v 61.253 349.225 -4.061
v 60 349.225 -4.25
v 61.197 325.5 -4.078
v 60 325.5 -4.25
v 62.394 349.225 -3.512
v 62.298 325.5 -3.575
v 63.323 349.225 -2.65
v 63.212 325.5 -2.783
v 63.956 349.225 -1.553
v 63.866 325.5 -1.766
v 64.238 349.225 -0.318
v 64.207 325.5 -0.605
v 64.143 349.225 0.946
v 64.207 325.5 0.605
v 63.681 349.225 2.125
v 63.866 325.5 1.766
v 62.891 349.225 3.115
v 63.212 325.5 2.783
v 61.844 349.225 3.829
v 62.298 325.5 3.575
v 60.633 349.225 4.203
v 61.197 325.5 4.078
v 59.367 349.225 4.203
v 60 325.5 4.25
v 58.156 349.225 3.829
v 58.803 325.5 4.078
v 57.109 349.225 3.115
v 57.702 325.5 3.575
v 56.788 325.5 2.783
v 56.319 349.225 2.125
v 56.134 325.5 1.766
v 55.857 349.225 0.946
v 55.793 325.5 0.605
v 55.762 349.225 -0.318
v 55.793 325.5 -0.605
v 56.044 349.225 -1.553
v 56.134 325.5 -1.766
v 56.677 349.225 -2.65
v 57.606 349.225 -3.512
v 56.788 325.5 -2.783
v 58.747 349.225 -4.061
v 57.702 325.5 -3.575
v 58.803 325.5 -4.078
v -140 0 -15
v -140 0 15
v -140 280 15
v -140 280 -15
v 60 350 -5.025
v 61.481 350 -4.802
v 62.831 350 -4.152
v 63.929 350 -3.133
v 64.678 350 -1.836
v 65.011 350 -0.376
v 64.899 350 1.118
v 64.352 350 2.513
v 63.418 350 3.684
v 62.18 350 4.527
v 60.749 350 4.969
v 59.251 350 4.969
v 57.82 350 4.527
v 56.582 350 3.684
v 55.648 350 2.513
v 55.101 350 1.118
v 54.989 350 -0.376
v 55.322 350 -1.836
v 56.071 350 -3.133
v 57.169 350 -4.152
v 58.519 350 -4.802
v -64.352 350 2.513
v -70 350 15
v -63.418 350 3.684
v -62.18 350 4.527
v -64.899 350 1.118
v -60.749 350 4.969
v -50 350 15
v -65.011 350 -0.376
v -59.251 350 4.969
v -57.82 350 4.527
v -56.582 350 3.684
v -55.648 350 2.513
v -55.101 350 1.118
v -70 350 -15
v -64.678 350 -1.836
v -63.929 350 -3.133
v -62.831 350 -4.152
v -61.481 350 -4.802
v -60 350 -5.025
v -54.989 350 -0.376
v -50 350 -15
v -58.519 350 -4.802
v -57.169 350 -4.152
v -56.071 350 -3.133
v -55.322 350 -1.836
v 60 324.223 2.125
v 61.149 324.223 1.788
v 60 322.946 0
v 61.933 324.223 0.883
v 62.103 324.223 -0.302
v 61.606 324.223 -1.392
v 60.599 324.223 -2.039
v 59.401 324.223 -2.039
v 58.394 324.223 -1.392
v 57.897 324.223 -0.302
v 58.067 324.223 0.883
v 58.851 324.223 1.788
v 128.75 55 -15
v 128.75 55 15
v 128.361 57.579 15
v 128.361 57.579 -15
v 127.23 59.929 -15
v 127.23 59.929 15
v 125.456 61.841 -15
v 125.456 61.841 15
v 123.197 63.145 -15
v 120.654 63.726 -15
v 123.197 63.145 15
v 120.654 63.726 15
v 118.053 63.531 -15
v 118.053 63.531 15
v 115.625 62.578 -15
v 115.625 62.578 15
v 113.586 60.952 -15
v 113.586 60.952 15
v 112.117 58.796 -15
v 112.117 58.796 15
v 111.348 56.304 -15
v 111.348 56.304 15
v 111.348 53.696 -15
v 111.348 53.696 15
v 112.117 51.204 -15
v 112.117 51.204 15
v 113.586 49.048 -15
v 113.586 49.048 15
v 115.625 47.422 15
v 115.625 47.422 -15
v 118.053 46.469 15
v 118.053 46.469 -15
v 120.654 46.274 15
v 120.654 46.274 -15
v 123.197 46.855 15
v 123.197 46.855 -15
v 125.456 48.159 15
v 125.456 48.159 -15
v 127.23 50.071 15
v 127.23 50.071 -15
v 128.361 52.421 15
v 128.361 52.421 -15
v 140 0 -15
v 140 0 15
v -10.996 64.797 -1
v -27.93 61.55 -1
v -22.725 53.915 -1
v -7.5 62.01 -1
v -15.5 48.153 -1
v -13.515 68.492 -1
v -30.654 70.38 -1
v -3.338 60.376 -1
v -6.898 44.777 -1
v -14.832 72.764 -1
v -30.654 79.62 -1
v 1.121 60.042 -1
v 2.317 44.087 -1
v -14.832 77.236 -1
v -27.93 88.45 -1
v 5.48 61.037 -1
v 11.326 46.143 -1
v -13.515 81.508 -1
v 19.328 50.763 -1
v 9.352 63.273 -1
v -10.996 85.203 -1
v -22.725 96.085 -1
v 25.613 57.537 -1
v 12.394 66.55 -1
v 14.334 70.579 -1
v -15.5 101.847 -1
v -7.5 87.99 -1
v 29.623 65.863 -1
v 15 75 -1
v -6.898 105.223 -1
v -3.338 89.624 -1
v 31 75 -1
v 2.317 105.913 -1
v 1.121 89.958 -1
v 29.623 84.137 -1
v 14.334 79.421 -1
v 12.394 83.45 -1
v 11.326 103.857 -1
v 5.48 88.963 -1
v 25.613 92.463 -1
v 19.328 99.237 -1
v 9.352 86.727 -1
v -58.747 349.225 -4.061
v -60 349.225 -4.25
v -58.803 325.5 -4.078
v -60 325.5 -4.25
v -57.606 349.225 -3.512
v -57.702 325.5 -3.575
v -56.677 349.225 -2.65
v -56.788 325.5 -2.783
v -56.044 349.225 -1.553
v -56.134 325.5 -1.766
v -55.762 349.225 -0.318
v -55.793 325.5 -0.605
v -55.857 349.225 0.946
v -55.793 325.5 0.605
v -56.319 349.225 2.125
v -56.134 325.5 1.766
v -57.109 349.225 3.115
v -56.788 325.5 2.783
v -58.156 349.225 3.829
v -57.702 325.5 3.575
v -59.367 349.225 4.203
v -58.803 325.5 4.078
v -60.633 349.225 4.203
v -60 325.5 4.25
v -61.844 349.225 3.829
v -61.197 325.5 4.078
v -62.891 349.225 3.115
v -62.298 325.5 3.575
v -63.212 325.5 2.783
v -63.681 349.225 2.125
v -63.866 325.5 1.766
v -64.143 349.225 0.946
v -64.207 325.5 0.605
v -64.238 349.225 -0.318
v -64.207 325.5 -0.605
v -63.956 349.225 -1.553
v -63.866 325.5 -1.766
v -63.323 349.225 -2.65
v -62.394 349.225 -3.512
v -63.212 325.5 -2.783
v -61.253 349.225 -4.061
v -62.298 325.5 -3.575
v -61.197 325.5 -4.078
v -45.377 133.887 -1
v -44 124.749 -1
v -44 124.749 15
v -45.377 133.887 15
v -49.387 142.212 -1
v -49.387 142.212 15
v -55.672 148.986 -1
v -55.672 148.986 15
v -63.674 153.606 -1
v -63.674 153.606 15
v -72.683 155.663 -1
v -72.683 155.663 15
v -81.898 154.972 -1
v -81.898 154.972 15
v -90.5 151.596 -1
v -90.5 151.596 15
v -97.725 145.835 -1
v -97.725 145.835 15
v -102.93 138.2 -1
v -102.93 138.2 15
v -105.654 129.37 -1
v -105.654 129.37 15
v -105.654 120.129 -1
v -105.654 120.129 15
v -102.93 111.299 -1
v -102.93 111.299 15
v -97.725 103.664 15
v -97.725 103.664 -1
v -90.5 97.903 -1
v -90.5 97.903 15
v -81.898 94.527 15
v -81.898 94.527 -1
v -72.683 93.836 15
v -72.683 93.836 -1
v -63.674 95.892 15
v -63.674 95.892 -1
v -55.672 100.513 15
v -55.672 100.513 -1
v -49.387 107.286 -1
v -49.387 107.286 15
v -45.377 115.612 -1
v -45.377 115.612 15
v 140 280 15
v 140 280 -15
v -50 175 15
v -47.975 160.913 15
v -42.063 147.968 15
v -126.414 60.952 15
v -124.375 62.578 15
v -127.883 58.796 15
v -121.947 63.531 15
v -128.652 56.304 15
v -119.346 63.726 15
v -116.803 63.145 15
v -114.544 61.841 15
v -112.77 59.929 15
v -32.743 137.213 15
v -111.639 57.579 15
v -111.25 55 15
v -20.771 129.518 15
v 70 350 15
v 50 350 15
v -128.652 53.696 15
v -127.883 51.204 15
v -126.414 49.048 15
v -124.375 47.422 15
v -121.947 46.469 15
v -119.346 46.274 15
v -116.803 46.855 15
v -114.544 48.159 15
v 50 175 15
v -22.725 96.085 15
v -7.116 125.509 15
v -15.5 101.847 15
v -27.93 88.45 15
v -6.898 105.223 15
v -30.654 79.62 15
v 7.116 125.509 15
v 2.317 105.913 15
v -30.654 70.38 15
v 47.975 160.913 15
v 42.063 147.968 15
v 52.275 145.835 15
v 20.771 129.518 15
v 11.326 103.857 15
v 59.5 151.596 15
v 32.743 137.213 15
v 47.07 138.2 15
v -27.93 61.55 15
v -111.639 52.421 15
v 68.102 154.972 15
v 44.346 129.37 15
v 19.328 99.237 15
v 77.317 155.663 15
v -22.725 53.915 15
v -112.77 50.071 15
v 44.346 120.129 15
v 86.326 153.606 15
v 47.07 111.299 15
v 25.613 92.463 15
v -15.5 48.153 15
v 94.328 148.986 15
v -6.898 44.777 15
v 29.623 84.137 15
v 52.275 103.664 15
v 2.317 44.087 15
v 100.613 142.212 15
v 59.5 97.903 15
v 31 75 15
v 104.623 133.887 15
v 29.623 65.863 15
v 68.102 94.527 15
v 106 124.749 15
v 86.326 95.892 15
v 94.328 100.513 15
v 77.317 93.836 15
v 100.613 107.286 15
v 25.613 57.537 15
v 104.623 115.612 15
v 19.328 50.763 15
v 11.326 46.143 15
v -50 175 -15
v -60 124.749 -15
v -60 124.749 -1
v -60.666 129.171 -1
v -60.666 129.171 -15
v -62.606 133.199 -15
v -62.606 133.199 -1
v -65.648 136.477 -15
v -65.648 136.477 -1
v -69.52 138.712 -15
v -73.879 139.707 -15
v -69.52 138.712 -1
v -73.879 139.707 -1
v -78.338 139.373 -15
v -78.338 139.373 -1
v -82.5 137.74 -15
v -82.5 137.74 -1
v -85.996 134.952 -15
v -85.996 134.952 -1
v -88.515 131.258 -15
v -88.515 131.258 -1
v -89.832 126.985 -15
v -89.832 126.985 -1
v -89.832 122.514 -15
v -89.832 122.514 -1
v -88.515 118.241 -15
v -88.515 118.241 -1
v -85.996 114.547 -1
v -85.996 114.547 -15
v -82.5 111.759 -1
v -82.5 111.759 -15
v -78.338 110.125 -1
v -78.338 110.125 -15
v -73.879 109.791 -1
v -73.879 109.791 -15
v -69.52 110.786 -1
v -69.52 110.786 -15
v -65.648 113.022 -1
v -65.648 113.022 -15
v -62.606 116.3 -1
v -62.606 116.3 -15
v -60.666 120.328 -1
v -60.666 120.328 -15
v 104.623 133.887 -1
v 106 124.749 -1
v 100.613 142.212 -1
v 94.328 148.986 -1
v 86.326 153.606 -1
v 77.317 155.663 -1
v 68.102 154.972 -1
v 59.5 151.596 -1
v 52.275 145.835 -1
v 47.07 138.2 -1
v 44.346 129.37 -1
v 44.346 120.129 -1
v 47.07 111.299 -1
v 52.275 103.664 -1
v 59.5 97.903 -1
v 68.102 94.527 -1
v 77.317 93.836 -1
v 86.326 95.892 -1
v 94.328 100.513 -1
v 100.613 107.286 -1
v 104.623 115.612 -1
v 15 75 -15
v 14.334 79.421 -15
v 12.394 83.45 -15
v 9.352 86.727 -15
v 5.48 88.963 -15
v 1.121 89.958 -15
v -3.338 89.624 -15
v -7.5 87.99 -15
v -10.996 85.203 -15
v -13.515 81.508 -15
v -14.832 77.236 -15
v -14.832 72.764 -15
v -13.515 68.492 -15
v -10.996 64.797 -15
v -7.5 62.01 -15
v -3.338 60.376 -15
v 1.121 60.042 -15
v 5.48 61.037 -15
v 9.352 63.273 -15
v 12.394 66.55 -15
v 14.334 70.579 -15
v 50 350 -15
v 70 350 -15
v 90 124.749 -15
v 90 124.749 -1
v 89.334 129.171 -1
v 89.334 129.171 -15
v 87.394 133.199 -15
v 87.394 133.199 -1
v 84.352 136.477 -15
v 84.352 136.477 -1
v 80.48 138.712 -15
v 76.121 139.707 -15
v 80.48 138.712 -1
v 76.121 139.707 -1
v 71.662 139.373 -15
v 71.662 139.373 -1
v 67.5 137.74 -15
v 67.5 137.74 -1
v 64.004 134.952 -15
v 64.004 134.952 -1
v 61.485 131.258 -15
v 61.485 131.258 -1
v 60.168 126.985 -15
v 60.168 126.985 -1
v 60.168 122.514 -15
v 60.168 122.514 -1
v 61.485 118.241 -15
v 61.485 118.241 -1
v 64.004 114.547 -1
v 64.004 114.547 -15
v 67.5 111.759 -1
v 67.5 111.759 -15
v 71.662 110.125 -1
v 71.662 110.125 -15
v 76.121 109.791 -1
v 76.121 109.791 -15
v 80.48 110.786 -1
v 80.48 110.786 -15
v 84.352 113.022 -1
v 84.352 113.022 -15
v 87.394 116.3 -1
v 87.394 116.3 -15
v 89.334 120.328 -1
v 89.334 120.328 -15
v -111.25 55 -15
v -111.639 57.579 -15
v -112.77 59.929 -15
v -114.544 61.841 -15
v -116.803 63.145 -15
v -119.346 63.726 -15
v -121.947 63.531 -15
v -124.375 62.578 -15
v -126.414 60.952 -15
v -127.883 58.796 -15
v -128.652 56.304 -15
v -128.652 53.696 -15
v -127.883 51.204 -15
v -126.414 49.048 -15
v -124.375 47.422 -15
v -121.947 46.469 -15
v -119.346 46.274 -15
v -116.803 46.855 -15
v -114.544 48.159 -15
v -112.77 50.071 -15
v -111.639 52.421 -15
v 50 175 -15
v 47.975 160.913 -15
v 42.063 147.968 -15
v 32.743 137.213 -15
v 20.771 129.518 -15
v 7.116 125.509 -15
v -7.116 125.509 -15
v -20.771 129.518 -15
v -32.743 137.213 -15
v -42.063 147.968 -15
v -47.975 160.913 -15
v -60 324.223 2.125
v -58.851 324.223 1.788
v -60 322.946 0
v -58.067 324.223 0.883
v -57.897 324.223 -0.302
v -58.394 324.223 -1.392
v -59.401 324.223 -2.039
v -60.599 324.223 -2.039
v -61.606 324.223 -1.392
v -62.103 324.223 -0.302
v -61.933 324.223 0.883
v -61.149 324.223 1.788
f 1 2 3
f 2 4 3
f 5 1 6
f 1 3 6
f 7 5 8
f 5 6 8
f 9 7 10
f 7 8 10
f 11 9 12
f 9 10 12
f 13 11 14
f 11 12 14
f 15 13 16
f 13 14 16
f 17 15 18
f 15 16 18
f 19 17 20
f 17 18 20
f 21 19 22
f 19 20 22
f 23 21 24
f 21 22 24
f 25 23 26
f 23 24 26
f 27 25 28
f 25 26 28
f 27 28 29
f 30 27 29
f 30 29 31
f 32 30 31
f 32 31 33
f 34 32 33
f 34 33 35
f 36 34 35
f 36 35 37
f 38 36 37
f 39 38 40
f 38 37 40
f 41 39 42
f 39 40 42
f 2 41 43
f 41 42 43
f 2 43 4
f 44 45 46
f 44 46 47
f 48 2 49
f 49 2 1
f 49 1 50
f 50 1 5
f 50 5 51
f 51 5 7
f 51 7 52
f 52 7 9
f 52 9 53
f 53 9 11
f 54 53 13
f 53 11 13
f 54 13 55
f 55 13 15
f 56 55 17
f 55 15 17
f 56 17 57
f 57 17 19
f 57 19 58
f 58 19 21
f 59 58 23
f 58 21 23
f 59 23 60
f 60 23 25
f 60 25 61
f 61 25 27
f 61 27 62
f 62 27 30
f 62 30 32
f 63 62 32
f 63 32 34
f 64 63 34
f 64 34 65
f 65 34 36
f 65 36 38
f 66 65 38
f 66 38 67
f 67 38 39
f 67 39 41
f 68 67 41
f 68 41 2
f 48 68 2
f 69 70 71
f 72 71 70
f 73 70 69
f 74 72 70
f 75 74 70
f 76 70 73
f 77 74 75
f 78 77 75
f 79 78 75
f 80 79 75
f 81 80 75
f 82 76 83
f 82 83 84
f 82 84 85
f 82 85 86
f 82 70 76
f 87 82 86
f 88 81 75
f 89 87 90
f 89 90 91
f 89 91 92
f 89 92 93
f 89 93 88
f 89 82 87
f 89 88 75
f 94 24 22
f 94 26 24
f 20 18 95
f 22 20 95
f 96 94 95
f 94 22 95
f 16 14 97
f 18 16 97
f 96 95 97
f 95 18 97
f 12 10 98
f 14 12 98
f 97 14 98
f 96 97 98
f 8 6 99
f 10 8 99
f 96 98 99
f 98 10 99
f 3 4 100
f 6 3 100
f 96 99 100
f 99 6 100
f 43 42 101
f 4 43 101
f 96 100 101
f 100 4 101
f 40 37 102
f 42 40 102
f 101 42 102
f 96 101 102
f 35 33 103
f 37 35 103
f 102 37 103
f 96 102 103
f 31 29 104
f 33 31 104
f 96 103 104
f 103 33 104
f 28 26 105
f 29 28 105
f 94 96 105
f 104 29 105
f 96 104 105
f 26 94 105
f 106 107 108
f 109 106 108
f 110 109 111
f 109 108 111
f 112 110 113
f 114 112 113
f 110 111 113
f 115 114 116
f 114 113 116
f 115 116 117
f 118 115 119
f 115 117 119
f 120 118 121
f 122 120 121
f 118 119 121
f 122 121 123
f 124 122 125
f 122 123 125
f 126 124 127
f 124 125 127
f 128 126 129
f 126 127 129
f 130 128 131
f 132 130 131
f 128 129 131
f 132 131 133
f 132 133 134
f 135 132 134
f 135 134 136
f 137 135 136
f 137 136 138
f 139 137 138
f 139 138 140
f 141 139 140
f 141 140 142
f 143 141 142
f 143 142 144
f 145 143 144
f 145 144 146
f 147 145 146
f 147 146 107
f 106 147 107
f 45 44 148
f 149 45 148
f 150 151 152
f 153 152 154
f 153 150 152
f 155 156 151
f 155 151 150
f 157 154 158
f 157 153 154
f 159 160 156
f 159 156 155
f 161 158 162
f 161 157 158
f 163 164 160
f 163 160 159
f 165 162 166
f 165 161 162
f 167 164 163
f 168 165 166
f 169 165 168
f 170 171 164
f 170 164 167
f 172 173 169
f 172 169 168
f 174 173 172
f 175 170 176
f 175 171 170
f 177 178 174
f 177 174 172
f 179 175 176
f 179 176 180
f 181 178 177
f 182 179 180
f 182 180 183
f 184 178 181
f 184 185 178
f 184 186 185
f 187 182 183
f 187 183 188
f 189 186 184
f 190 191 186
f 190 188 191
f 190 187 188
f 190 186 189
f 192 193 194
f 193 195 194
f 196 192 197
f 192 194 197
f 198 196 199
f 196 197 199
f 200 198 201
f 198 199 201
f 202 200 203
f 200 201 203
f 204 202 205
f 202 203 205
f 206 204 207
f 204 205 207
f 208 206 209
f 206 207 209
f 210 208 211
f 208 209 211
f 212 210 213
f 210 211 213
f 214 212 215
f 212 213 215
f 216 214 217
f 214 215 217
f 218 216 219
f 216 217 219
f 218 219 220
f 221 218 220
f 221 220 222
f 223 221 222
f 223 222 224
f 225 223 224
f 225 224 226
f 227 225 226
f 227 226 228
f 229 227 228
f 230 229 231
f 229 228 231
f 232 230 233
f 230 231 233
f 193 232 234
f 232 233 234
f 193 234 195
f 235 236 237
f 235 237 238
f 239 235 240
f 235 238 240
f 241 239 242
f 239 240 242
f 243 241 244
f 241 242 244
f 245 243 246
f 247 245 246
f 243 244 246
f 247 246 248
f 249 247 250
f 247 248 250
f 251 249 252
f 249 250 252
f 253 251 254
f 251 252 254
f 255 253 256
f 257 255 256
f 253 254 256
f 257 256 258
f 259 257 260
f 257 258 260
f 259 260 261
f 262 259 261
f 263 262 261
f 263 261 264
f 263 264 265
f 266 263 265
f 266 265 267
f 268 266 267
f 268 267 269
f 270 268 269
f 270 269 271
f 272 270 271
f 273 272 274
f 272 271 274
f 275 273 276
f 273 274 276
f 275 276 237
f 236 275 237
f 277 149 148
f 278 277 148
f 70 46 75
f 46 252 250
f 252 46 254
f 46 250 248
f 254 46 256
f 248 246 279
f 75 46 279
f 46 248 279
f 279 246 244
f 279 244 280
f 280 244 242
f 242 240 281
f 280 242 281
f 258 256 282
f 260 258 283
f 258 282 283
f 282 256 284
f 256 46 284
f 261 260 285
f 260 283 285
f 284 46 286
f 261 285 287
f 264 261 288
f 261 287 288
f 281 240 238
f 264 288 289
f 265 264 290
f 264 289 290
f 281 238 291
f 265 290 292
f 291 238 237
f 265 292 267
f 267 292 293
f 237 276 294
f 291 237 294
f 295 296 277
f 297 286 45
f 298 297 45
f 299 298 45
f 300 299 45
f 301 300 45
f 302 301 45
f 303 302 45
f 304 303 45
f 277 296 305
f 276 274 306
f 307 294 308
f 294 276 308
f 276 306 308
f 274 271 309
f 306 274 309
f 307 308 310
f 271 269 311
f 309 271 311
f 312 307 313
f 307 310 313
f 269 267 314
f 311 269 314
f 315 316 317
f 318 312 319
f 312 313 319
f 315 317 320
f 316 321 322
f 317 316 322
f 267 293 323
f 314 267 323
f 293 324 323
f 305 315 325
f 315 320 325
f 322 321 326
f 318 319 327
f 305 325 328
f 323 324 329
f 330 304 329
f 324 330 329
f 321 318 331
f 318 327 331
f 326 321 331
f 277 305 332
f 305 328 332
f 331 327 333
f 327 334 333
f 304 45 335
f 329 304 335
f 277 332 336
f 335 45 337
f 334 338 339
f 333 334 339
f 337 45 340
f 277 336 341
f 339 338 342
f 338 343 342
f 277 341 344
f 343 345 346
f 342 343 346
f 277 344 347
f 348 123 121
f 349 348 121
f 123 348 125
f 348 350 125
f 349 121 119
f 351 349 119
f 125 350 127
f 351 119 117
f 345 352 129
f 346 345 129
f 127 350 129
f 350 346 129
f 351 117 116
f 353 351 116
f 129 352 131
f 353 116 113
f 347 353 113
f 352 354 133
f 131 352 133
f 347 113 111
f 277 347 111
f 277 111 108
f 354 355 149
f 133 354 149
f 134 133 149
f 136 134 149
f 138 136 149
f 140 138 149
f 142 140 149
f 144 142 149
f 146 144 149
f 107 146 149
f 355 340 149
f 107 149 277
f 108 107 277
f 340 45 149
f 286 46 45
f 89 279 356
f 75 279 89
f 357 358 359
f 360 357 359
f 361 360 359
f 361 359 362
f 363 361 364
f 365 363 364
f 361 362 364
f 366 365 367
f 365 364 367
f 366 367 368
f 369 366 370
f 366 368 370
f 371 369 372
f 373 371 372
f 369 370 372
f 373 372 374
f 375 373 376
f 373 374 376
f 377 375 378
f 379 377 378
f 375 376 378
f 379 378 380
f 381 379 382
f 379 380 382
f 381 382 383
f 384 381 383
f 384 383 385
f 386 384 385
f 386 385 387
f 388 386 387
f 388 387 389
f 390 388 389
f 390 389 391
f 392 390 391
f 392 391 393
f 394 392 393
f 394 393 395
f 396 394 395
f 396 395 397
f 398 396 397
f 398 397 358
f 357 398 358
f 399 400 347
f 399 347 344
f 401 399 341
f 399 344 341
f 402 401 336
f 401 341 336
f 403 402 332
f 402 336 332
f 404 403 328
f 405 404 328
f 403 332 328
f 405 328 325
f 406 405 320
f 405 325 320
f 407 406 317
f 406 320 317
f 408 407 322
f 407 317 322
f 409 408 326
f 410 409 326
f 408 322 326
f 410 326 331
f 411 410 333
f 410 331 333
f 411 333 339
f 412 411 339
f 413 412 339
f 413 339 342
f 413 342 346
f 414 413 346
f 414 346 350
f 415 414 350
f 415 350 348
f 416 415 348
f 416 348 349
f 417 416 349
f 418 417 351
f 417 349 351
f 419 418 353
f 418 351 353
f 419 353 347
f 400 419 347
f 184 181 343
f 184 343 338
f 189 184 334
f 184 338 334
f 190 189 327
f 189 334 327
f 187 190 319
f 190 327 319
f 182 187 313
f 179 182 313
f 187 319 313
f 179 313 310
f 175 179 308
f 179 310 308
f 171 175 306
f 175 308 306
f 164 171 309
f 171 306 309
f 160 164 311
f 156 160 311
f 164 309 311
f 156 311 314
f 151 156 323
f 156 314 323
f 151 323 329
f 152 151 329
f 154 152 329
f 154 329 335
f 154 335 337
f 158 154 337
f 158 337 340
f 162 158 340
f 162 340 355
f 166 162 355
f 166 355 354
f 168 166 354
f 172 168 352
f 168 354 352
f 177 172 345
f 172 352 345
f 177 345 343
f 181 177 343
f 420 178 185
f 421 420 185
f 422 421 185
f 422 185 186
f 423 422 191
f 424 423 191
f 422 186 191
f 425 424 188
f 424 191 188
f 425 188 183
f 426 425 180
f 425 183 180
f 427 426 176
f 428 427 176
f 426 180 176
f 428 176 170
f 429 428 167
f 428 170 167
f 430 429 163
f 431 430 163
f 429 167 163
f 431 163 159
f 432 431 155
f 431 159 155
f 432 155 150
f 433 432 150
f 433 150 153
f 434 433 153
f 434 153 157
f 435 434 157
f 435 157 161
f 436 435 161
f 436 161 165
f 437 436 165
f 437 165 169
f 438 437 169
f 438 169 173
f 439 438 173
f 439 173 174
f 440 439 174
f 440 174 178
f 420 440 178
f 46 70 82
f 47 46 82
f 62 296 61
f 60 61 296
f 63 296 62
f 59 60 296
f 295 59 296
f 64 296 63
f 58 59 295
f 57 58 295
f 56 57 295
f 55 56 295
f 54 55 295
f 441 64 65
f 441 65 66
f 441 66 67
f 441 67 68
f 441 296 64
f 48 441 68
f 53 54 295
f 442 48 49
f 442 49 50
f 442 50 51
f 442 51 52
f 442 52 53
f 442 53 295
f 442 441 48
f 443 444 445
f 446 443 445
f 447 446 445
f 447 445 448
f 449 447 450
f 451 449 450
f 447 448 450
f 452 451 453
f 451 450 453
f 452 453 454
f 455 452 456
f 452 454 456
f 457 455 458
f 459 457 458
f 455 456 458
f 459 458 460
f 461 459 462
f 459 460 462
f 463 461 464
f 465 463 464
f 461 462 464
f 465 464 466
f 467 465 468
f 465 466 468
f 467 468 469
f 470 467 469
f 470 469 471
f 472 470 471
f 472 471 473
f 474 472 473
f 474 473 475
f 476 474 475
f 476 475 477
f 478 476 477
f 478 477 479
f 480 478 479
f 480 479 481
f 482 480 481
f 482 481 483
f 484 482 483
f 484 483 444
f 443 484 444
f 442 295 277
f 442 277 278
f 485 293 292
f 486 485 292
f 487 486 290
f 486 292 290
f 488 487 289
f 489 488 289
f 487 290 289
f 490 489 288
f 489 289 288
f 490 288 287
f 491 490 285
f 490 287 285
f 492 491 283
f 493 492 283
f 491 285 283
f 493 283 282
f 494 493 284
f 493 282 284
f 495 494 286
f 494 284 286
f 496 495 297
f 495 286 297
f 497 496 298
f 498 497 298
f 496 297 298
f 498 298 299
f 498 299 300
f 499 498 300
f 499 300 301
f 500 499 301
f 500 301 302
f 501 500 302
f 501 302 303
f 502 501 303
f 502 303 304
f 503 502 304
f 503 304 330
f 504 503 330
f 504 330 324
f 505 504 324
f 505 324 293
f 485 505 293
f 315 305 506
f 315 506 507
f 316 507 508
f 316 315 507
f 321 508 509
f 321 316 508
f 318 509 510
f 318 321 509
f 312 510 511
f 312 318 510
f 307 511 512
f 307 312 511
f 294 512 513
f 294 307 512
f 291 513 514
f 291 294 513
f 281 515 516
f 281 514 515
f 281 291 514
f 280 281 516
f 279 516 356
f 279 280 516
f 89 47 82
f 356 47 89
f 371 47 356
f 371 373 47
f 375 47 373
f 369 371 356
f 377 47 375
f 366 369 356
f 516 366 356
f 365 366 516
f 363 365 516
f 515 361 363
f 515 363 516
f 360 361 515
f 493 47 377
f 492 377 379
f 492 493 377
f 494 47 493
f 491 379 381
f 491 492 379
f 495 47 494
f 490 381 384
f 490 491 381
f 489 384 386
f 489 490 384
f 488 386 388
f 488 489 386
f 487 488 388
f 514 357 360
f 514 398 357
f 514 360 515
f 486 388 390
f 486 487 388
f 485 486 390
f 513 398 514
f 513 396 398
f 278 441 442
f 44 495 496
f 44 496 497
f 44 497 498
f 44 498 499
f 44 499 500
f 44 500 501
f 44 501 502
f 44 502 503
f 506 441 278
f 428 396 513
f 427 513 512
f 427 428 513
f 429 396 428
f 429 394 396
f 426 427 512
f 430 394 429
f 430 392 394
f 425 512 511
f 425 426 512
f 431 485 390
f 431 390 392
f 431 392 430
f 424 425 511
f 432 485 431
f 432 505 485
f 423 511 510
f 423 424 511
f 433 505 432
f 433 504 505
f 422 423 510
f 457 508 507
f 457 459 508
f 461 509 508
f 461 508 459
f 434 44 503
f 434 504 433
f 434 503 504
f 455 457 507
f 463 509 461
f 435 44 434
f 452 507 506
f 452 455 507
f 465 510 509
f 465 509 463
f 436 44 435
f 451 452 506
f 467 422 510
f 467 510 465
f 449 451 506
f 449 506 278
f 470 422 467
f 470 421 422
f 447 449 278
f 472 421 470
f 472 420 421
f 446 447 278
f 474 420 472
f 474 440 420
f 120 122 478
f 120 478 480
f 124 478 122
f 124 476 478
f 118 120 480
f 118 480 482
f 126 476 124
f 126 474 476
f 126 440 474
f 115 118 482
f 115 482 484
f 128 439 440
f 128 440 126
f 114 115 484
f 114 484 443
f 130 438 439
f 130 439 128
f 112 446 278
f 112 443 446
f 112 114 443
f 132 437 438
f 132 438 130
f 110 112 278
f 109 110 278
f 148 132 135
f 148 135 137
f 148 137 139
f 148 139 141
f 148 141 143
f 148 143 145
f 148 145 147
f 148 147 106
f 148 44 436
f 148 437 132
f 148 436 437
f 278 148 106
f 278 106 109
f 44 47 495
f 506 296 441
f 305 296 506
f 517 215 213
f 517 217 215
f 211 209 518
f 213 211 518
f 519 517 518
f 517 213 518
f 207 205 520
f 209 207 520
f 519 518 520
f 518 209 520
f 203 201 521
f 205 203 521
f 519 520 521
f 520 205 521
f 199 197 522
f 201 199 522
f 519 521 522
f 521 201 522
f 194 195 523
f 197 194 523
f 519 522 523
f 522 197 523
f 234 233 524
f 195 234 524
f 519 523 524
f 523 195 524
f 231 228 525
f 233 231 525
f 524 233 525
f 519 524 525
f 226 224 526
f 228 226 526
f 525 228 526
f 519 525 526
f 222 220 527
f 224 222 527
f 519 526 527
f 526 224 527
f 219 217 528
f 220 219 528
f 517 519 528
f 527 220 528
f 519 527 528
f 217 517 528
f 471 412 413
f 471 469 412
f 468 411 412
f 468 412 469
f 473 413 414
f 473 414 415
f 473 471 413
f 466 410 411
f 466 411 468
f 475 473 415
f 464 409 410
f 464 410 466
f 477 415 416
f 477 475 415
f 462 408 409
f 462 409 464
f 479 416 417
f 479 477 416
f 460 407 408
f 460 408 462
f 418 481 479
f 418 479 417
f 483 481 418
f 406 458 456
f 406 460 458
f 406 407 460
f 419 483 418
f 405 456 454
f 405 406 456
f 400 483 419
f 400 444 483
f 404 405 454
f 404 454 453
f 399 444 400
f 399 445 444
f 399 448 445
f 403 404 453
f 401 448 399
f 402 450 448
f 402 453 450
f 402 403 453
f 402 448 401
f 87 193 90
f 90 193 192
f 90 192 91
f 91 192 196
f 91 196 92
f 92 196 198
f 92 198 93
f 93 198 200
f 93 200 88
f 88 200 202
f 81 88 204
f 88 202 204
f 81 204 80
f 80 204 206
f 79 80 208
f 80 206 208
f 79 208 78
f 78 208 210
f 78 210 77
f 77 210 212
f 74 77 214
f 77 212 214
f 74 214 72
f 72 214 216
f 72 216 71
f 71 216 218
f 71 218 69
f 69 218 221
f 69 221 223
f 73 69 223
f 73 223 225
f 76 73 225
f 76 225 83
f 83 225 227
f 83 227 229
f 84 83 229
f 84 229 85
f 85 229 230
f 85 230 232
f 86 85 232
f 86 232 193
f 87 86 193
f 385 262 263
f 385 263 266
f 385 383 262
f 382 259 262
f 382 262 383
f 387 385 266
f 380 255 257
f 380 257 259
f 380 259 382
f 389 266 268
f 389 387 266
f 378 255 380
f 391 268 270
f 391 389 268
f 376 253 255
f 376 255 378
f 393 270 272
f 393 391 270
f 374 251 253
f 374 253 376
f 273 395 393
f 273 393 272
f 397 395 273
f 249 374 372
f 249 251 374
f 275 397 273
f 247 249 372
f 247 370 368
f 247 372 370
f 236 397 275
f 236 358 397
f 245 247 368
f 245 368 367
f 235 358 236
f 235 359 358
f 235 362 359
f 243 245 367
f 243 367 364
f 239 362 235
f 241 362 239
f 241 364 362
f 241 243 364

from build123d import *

# Parameters (mm, degrees)
SKETCH1_W                    = 280
SKETCH1_H                    = 30
BOSS_EXTRUDE1_DEPTH          = 350
CUT_EXTRUDE1_DEPTH           = 350
CHAMFER1_SIZE                = 70
M10_TAPPED_HOLE3_D           = 8.5
M10_TAPPED_HOLE3_DEPTH       = 24.5
M10_TAPPED_HOLE3_CSINK_D     = 10.05
M10_TAPPED_HOLE3_CSINK_ANGLE = 90
M10_TAPPED_HOLE3_TIP         = 2.553657631
SKETCH11_R                   = 8.75
CUT_EXTRUDE3_DEPTH           = 350
SKETCH12_R                   = 15
CUT_EXTRUDE4_DEPTH           = 350
SKETCH13_R                   = 31
CUT_EXTRUDE5_DEPTH           = 16


with BuildPart() as part:
    # Sketch1 → Boss-Extrude1 (new body)
    with BuildSketch(Plane(origin=(0, 0, 0), x_dir=(1, 0, 0), z_dir=(0, 1, 0))):
        Rectangle(SKETCH1_W, SKETCH1_H)
    extrude(amount=BOSS_EXTRUDE1_DEPTH)

    # Sketch2 → Cut-Extrude1 (cut)
    with BuildSketch(Plane.XY.offset(15)):
        with BuildLine():
            Line((50, 350), (50, 175))
            ThreePointArc((50, 175), (0, 125), (-50, 175))
            Line((-50, 175), (-50, 350))
            ThreePointArc((-50, 350), (0, 400), (50, 350))
        make_face()
    extrude(amount=-CUT_EXTRUDE1_DEPTH, mode=Mode.SUBTRACT)

    # Chamfer1
    chamfer1_edges = [part.edges().sort_by_distance(p)[0] for p in [
        (-140, 350, 0),
        (140, 350, 0),
    ]]
    chamfer(chamfer1_edges, length=CHAMFER1_SIZE)

    # M10 Tapped Hole3
    with Locations(Plane(origin=(-60, 350, 0), x_dir=(0, 0, 1), z_dir=(0, 1, 0))):
        with Locations((0, 0), (0, 120)):
            CounterSinkHole(M10_TAPPED_HOLE3_D / 2, M10_TAPPED_HOLE3_CSINK_D / 2, depth=M10_TAPPED_HOLE3_DEPTH, counter_sink_angle=M10_TAPPED_HOLE3_CSINK_ANGLE)
            with Locations((0, 0, -(M10_TAPPED_HOLE3_DEPTH + M10_TAPPED_HOLE3_TIP / 2))):  # 118° drill point
                Cone(0, M10_TAPPED_HOLE3_D / 2, M10_TAPPED_HOLE3_TIP, mode=Mode.SUBTRACT)

    # Sketch11 → Cut-Extrude3 (cut)
    with BuildSketch(Plane.XY.offset(15)):
        with Locations((-120, 55)):
            Circle(SKETCH11_R)
        with Locations((120, 55)):
            Circle(SKETCH11_R)
    extrude(amount=-CUT_EXTRUDE3_DEPTH, mode=Mode.SUBTRACT)

    # Sketch12 → Cut-Extrude4 (cut)
    with BuildSketch(Plane.XY.offset(15)):
        with Locations((-75, 124.749371855)):
            Circle(SKETCH12_R)
        with Locations((75, 124.749371855)):
            Circle(SKETCH12_R)
        with Locations((0, 75)):
            Circle(SKETCH12_R)
    extrude(amount=-CUT_EXTRUDE4_DEPTH, mode=Mode.SUBTRACT)

    # Sketch13 → Cut-Extrude5 (cut)
    with BuildSketch(Plane.XY.offset(15)):
        with Locations((-75, 124.749371855)):
            Circle(SKETCH13_R)
        with Locations((0, 75)):
            Circle(SKETCH13_R)
        with Locations((75, 124.749371855)):
            Circle(SKETCH13_R)
    extrude(amount=-CUT_EXTRUDE5_DEPTH, mode=Mode.SUBTRACT)


solid = part.part
